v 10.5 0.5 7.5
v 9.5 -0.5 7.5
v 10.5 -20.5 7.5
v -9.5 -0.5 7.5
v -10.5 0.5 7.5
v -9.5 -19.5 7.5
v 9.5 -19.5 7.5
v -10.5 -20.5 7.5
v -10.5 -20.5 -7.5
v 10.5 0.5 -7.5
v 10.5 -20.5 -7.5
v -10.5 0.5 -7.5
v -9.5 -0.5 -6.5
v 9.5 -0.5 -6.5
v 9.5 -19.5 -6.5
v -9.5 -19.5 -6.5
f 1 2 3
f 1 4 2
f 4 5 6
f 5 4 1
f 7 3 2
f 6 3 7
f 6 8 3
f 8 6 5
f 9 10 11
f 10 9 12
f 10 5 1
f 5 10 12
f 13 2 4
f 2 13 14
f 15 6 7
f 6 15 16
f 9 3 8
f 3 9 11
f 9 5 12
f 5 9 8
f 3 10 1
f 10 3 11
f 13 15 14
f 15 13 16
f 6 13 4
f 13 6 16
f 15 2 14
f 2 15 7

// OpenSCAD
scale([1,1,1]){
    
cube([20,1,15],center=true);

translate([0,-20,0])
cube([20,1,15],center=true);

// bottom
translate([0,-10,-7])
rotate([90,0,0])
cube([21,1,21],center=true);

translate([-10,-10,0])
rotate([0,0,90])
cube([21,1,15],center=true);

translate([10,-10,0])
rotate([0,0,90])
cube([21,1,15],center=true);

    }
